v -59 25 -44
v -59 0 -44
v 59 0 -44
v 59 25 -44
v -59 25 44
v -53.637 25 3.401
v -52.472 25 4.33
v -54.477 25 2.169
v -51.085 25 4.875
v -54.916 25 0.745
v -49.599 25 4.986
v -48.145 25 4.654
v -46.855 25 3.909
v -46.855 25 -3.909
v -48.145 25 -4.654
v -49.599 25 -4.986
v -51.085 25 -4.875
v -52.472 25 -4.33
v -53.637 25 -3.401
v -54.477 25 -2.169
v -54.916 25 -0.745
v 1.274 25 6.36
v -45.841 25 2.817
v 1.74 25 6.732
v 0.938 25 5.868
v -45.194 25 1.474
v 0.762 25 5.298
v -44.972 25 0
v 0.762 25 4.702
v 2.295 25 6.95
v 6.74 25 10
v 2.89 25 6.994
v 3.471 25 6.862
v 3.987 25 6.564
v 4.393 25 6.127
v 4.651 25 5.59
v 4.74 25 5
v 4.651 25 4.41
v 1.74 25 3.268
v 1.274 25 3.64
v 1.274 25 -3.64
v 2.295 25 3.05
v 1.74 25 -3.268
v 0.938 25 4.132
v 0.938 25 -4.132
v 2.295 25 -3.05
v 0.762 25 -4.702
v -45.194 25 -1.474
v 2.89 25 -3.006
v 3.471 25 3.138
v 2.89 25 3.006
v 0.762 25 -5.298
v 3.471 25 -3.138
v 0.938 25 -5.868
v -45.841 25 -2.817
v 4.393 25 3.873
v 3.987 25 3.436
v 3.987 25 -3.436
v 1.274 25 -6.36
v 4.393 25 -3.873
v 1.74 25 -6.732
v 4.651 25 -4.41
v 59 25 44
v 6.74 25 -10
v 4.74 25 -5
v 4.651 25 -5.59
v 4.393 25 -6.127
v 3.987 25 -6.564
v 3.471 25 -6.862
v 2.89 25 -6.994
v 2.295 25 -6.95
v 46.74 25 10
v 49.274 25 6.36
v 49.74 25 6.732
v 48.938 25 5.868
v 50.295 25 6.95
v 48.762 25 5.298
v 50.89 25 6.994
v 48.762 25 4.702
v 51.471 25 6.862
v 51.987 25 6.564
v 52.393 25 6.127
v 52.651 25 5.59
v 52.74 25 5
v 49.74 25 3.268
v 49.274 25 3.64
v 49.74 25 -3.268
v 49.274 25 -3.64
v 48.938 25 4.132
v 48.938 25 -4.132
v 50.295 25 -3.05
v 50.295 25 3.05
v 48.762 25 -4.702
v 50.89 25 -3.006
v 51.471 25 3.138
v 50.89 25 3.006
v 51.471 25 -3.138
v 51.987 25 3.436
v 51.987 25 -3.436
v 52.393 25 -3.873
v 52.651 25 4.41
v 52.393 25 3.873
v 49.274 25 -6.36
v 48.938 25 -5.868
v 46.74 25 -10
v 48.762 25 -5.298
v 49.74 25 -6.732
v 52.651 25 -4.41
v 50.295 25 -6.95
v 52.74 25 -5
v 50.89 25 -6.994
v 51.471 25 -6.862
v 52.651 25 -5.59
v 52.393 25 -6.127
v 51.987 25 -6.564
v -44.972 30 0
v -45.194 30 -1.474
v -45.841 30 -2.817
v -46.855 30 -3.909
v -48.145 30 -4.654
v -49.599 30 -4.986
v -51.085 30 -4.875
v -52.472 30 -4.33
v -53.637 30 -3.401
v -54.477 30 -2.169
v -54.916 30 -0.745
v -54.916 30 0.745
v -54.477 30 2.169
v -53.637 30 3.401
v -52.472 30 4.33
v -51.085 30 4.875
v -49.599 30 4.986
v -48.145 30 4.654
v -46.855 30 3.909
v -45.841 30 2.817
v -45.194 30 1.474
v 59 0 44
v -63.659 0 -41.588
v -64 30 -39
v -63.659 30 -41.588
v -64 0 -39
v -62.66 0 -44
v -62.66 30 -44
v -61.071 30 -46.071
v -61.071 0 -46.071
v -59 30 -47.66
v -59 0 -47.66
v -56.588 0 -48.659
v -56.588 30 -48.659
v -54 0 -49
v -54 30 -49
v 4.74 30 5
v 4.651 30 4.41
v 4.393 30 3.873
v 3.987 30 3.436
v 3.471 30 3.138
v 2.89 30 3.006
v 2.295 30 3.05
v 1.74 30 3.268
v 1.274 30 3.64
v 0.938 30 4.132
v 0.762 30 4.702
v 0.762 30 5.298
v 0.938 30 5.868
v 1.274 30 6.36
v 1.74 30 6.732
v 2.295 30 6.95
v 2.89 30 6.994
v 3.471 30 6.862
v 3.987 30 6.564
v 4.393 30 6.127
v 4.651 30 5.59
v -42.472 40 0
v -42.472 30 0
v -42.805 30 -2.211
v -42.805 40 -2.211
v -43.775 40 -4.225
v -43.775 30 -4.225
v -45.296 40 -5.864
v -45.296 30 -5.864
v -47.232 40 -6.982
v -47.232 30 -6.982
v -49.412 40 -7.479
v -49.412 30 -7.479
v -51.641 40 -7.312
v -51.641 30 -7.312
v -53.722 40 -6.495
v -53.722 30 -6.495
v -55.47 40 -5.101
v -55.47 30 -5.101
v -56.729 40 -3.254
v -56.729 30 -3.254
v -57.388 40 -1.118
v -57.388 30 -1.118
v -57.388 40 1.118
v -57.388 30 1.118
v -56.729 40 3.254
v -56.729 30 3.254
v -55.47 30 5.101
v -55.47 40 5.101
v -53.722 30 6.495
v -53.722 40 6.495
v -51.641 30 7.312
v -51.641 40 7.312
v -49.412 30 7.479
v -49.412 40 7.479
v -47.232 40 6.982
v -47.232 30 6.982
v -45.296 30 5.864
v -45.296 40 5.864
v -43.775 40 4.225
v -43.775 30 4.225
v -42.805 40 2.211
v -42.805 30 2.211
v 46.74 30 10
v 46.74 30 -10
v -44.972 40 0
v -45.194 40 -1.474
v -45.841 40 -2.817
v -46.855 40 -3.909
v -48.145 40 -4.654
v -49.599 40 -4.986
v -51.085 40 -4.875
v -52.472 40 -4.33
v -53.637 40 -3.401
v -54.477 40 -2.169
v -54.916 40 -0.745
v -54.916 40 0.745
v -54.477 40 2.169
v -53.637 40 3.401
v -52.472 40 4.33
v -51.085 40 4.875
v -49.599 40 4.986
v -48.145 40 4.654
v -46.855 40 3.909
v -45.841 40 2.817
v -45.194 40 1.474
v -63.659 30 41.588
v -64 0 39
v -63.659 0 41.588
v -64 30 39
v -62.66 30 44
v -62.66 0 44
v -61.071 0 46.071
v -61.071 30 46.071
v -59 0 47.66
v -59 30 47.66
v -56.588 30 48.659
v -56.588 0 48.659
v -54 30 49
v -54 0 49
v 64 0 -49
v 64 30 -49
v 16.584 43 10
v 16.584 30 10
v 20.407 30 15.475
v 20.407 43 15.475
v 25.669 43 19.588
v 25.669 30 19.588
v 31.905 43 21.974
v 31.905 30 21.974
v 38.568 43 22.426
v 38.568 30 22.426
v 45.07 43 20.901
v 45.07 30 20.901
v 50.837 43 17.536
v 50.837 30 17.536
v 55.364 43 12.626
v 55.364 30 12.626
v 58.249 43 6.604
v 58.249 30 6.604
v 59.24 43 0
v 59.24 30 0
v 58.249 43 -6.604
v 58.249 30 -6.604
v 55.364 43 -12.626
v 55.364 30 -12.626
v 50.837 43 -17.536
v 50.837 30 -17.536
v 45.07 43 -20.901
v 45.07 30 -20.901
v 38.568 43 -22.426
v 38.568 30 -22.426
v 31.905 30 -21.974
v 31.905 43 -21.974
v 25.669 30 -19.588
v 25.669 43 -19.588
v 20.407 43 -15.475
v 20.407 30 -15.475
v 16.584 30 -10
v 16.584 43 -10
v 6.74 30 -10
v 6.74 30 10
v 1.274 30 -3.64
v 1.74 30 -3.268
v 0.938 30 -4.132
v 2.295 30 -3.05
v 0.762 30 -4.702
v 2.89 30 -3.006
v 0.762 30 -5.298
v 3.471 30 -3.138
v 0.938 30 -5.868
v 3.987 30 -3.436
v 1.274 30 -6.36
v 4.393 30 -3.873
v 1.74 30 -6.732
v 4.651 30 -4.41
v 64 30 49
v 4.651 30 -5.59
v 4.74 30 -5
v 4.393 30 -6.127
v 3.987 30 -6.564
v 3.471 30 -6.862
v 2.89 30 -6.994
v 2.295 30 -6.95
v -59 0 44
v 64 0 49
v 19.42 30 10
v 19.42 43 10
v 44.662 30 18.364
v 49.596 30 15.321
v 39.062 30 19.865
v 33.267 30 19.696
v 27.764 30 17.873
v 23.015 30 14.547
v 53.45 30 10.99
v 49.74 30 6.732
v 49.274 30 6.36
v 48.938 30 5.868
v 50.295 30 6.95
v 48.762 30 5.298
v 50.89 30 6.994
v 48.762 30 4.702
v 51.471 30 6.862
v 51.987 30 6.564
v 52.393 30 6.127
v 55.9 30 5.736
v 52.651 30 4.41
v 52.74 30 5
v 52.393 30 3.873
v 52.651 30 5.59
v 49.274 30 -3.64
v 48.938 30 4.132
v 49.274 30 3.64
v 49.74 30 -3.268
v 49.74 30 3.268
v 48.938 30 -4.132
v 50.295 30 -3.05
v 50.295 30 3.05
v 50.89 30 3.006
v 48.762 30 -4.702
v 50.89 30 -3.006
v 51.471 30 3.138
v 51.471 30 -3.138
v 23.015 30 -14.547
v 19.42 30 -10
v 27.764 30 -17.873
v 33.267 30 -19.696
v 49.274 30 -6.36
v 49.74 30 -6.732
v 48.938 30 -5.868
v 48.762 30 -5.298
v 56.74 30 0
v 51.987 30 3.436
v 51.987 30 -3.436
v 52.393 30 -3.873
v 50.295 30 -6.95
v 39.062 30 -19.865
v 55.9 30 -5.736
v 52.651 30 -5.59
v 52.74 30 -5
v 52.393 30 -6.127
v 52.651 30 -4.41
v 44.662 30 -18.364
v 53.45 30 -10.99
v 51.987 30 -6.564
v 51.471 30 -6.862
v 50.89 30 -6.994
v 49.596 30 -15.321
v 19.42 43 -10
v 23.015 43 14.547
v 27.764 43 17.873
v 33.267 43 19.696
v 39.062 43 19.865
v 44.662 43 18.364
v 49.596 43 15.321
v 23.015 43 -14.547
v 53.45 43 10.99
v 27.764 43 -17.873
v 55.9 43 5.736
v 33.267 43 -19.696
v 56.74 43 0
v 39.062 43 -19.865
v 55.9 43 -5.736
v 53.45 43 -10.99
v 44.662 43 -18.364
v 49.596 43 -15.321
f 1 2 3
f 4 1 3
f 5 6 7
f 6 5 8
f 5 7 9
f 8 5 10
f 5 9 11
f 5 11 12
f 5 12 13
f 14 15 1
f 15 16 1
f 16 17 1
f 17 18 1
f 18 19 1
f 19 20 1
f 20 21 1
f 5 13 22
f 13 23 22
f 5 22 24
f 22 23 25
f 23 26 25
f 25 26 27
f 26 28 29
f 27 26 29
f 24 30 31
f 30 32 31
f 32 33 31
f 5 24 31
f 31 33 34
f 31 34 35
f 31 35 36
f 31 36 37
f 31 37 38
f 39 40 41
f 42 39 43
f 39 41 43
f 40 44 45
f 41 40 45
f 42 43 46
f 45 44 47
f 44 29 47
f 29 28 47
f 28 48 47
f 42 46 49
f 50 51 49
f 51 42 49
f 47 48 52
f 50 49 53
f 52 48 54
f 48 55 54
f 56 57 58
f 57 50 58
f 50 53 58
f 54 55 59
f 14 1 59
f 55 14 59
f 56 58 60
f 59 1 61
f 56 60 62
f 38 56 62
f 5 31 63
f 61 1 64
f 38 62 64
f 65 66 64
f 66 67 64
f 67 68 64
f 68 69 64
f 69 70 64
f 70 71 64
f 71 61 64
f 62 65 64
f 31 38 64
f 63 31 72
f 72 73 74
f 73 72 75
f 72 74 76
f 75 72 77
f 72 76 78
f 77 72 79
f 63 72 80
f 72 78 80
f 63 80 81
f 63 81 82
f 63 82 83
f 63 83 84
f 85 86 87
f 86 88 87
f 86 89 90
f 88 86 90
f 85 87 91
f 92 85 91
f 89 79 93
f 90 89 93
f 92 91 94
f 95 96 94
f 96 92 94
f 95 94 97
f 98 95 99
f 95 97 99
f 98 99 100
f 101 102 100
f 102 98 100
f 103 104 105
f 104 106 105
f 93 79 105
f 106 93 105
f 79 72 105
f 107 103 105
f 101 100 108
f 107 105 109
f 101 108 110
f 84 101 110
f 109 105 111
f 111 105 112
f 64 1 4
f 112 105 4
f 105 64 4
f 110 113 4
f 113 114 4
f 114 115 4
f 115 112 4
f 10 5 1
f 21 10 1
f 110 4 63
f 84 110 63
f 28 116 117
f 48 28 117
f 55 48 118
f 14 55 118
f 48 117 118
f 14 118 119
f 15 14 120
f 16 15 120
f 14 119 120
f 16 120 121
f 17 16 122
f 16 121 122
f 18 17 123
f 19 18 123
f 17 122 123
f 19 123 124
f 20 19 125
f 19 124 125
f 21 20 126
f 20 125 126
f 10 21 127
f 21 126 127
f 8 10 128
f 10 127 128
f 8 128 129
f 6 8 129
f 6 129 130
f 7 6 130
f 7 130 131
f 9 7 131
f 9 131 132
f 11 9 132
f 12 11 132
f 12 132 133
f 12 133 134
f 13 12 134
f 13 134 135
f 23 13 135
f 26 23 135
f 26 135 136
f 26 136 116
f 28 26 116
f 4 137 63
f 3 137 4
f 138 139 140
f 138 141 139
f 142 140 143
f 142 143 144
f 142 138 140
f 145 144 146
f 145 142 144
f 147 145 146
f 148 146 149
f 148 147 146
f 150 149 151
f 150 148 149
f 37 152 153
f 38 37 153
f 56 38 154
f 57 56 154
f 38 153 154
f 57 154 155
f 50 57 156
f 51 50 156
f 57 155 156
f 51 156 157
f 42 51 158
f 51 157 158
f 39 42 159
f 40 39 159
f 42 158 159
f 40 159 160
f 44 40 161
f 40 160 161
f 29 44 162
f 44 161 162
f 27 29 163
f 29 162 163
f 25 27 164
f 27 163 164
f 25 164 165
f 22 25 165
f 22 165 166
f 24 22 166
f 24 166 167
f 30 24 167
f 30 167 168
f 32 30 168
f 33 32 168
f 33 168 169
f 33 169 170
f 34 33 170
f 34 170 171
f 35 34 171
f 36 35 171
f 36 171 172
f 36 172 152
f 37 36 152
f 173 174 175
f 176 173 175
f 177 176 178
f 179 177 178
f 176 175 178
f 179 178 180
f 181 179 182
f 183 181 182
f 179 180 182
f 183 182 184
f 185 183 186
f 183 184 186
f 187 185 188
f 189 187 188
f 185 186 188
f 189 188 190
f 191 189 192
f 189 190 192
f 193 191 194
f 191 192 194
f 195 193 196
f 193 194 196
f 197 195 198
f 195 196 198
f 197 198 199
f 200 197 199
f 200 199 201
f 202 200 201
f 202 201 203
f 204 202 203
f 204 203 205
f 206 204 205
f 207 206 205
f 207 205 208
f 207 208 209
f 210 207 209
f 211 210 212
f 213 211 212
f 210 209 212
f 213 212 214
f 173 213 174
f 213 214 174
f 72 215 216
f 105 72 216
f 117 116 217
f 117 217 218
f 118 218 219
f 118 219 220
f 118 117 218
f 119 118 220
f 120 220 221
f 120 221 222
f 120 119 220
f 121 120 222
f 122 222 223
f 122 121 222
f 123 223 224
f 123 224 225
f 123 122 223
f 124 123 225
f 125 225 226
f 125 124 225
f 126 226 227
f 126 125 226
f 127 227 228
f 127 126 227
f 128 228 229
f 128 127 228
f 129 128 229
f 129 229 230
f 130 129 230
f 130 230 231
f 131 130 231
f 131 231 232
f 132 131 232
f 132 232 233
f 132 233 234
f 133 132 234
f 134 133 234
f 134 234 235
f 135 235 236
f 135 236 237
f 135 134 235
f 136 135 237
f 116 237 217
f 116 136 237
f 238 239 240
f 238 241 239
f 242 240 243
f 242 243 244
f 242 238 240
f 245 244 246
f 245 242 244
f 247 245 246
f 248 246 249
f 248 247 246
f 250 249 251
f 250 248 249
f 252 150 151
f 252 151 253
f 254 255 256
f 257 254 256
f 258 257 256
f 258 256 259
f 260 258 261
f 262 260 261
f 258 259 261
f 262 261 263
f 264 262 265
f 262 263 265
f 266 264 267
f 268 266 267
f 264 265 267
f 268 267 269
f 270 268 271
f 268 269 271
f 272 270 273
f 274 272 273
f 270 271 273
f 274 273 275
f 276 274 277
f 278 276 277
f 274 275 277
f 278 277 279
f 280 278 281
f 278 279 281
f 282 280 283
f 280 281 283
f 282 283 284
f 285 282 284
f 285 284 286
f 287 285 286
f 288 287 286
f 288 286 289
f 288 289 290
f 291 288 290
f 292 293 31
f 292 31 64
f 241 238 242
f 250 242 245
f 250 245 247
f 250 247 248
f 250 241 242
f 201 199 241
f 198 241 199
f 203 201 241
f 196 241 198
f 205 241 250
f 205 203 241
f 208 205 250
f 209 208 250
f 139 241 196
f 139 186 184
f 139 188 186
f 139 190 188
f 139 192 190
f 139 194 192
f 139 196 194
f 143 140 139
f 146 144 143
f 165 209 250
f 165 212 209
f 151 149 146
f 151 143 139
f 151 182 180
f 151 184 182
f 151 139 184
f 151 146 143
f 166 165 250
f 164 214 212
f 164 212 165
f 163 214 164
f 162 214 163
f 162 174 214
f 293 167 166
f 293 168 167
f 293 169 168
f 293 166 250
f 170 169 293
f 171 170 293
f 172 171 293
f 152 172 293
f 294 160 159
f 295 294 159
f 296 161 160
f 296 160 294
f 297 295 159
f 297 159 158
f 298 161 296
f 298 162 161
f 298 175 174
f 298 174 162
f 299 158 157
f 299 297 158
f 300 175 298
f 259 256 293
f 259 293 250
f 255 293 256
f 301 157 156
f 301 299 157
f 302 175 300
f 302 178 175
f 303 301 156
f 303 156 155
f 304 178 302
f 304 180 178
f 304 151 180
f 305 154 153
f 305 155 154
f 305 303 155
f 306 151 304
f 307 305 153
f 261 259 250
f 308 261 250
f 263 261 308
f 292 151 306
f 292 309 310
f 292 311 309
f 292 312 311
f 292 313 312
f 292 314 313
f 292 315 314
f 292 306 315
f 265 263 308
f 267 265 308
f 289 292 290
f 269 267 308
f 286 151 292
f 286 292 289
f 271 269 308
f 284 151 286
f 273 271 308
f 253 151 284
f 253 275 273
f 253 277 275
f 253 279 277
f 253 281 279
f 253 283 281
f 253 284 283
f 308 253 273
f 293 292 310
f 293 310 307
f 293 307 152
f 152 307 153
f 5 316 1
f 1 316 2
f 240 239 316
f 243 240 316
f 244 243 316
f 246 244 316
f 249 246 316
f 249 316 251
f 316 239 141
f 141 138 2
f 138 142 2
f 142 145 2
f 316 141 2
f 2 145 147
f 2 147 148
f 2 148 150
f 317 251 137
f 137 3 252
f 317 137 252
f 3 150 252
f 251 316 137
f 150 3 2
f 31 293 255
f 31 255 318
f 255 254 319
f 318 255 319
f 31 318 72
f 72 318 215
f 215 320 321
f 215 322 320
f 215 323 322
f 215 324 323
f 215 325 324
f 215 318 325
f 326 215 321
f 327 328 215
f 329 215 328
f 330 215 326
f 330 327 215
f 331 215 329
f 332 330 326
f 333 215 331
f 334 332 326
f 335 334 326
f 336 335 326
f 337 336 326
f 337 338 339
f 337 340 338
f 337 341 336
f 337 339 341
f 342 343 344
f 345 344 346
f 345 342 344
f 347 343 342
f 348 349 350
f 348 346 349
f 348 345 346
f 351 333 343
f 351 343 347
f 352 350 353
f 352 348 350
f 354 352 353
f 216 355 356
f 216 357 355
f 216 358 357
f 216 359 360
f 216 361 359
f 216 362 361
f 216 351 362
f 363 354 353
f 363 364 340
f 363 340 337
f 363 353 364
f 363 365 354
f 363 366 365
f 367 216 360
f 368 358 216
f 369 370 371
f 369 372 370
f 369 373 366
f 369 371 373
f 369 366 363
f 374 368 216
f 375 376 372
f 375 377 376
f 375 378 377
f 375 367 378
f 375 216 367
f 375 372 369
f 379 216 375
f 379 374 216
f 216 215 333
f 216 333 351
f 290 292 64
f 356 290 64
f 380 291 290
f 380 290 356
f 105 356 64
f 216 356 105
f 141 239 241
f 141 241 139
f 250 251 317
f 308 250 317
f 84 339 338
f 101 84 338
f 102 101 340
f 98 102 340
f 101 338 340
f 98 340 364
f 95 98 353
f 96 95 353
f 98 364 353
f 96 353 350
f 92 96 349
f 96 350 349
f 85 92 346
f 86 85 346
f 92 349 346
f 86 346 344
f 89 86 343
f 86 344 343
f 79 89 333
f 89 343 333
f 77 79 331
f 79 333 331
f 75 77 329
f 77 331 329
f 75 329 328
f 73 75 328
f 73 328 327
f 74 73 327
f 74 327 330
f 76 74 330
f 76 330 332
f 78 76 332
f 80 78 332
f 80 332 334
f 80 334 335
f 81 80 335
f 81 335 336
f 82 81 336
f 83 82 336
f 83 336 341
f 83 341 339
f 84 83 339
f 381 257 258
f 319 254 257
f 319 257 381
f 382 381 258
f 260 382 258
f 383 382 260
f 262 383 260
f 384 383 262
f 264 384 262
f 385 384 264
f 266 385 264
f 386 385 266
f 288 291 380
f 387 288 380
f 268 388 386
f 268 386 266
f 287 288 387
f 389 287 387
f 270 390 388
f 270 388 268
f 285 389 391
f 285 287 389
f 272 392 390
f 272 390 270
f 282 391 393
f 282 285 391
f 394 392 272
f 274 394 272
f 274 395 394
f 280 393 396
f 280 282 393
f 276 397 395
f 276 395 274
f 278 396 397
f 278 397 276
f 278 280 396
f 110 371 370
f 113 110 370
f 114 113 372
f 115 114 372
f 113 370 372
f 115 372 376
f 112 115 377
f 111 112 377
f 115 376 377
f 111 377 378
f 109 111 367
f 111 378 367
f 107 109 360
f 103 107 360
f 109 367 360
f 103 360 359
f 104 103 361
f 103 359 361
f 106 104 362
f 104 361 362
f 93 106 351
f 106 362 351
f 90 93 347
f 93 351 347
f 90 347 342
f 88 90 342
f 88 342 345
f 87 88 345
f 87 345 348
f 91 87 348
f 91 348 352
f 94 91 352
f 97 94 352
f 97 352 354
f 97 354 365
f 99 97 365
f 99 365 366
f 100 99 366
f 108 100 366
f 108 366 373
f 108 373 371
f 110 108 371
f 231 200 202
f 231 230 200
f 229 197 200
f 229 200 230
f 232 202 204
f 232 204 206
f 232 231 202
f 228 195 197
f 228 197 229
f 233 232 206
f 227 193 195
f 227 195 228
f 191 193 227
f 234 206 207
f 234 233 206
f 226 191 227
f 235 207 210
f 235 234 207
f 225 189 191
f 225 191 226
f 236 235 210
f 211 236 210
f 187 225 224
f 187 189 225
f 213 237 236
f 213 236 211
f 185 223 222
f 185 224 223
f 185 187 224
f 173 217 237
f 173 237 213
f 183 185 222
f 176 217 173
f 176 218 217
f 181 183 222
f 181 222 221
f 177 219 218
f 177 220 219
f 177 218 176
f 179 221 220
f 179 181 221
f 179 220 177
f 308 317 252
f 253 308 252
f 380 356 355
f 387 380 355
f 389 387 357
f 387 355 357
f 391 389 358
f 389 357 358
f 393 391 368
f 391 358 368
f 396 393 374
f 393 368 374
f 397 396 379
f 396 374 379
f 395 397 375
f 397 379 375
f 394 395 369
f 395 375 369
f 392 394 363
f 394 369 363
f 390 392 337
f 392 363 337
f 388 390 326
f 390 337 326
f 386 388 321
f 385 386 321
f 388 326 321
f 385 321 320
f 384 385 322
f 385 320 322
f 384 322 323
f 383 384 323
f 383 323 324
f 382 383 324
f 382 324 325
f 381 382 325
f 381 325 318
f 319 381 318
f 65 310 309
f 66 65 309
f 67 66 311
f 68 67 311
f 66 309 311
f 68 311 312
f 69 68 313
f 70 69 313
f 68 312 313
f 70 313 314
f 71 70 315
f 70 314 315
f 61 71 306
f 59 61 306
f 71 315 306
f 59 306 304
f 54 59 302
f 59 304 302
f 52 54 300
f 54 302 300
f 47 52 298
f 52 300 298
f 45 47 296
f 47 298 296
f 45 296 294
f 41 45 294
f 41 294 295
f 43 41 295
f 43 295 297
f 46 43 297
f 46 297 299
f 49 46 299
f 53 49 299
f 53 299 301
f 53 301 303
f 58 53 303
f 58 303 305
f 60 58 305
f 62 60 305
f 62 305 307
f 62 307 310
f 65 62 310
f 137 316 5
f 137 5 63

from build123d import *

# Parameters (mm, degrees)
CROQUIS1_W              = 128
CROQUIS1_H              = 98
CROQUIS1_W_2            = 118
CROQUIS1_H_2            = 88
SALIENTE_EXTRUIR5_DEPTH = 30
CROQUIS6_W              = 128
CROQUIS6_H              = 98
SALIENTE_EXTRUIR6_DEPTH = 5
CROQUIS7_W              = 40
CROQUIS7_H              = 20
CORTAR_EXTRUIR2_DEPTH   = 10
REDONDEO1_R             = 10
CROQUIS8_R              = 2
CORTAR_EXTRUIR3_DEPTH   = 10
SALIENTE_EXTRUIR7_DEPTH = 13
CROQUIS11_R             = 5
CORTAR_EXTRUIR4_DEPTH   = 60
CROQUIS12_R             = 7.5
CROQUIS12_R_2           = 5
SALIENTE_EXTRUIR9_DEPTH = 10


with BuildPart() as part:
    # Croquis1 → Saliente-Extruir5 (new body)
    with BuildSketch(Plane(origin=(0, 0, 0), x_dir=(1, 0, 0), z_dir=(0, 1, 0))):
        Rectangle(CROQUIS1_W, CROQUIS1_H)
        Rectangle(CROQUIS1_W_2, CROQUIS1_H_2, mode=Mode.SUBTRACT)
    extrude(amount=SALIENTE_EXTRUIR5_DEPTH)

    # Croquis6 → Saliente-Extruir6 (add)
    with BuildSketch(Plane(origin=(0, 30, 0), x_dir=(1, 0, 0), z_dir=(0, 1, 0))):
        Rectangle(CROQUIS6_W, CROQUIS6_H)
    extrude(amount=-SALIENTE_EXTRUIR6_DEPTH)

    # Croquis7 → Cortar-Extruir2 (cut)
    with BuildSketch(Plane(origin=(0, 30, 0), x_dir=(1, 0, 0), z_dir=(0, 1, 0))):
        with Locations((26.740101048, 0)):
            Rectangle(CROQUIS7_W, CROQUIS7_H)
    extrude(amount=-CORTAR_EXTRUIR2_DEPTH, mode=Mode.SUBTRACT)

    # Redondeo1
    redondeo1_edges = [part.edges().sort_by_distance(p)[0] for p in [
        (-64, 15, 49),
        (-64, 15, -49),
    ]]
    fillet(redondeo1_edges, radius=REDONDEO1_R)

    # Croquis8 → Cortar-Extruir3 (cut)
    with BuildSketch(Plane(origin=(0, 30, 0), x_dir=(1, 0, 0), z_dir=(0, 1, 0))):
        with Locations((50.740101048, -5)):
            Circle(CROQUIS8_R)
        with Locations((50.740101048, 5)):
            Circle(CROQUIS8_R)
        with Locations((2.740101048, 5)):
            Circle(CROQUIS8_R)
        with Locations((2.740101048, -5)):
            Circle(CROQUIS8_R)
    extrude(amount=-CORTAR_EXTRUIR3_DEPTH, mode=Mode.SUBTRACT)

    # Croquis9 → Saliente-Extruir7 (add)
    with BuildSketch(Plane(origin=(0, 30, 0), x_dir=(1, 0, 0), z_dir=(0, 1, 0))):
        with BuildLine():
            Line((16.584456677, 10), (19.419592972, 10))
            ThreePointArc((19.419592972, 10), (56.740101048, 0), (19.419592972, -10))
            Line((19.419592972, -10), (16.584456677, -10))
            ThreePointArc((16.584456677, -10), (59.240101048, 0), (16.584456677, 10))
        make_face()
    extrude(amount=SALIENTE_EXTRUIR7_DEPTH)

    # Croquis11 → Cortar-Extruir4 (cut)
    with BuildSketch(Plane(origin=(0, 30, 0), x_dir=(1, 0, 0), z_dir=(0, 1, 0))):
        with Locations((-49.972168211, 0)):
            Circle(CROQUIS11_R)
    extrude(amount=-CORTAR_EXTRUIR4_DEPTH, mode=Mode.SUBTRACT)

    # Croquis12 → Saliente-Extruir9 (add)
    with BuildSketch(Plane(origin=(0, 30, 0), x_dir=(1, 0, 0), z_dir=(0, 1, 0))):
        with Locations((-49.972168211, 0)):
            Circle(CROQUIS12_R)
        with Locations((-49.972168211, 0)):
            Circle(CROQUIS12_R_2, mode=Mode.SUBTRACT)
    extrude(amount=SALIENTE_EXTRUIR9_DEPTH)


solid = part.part
